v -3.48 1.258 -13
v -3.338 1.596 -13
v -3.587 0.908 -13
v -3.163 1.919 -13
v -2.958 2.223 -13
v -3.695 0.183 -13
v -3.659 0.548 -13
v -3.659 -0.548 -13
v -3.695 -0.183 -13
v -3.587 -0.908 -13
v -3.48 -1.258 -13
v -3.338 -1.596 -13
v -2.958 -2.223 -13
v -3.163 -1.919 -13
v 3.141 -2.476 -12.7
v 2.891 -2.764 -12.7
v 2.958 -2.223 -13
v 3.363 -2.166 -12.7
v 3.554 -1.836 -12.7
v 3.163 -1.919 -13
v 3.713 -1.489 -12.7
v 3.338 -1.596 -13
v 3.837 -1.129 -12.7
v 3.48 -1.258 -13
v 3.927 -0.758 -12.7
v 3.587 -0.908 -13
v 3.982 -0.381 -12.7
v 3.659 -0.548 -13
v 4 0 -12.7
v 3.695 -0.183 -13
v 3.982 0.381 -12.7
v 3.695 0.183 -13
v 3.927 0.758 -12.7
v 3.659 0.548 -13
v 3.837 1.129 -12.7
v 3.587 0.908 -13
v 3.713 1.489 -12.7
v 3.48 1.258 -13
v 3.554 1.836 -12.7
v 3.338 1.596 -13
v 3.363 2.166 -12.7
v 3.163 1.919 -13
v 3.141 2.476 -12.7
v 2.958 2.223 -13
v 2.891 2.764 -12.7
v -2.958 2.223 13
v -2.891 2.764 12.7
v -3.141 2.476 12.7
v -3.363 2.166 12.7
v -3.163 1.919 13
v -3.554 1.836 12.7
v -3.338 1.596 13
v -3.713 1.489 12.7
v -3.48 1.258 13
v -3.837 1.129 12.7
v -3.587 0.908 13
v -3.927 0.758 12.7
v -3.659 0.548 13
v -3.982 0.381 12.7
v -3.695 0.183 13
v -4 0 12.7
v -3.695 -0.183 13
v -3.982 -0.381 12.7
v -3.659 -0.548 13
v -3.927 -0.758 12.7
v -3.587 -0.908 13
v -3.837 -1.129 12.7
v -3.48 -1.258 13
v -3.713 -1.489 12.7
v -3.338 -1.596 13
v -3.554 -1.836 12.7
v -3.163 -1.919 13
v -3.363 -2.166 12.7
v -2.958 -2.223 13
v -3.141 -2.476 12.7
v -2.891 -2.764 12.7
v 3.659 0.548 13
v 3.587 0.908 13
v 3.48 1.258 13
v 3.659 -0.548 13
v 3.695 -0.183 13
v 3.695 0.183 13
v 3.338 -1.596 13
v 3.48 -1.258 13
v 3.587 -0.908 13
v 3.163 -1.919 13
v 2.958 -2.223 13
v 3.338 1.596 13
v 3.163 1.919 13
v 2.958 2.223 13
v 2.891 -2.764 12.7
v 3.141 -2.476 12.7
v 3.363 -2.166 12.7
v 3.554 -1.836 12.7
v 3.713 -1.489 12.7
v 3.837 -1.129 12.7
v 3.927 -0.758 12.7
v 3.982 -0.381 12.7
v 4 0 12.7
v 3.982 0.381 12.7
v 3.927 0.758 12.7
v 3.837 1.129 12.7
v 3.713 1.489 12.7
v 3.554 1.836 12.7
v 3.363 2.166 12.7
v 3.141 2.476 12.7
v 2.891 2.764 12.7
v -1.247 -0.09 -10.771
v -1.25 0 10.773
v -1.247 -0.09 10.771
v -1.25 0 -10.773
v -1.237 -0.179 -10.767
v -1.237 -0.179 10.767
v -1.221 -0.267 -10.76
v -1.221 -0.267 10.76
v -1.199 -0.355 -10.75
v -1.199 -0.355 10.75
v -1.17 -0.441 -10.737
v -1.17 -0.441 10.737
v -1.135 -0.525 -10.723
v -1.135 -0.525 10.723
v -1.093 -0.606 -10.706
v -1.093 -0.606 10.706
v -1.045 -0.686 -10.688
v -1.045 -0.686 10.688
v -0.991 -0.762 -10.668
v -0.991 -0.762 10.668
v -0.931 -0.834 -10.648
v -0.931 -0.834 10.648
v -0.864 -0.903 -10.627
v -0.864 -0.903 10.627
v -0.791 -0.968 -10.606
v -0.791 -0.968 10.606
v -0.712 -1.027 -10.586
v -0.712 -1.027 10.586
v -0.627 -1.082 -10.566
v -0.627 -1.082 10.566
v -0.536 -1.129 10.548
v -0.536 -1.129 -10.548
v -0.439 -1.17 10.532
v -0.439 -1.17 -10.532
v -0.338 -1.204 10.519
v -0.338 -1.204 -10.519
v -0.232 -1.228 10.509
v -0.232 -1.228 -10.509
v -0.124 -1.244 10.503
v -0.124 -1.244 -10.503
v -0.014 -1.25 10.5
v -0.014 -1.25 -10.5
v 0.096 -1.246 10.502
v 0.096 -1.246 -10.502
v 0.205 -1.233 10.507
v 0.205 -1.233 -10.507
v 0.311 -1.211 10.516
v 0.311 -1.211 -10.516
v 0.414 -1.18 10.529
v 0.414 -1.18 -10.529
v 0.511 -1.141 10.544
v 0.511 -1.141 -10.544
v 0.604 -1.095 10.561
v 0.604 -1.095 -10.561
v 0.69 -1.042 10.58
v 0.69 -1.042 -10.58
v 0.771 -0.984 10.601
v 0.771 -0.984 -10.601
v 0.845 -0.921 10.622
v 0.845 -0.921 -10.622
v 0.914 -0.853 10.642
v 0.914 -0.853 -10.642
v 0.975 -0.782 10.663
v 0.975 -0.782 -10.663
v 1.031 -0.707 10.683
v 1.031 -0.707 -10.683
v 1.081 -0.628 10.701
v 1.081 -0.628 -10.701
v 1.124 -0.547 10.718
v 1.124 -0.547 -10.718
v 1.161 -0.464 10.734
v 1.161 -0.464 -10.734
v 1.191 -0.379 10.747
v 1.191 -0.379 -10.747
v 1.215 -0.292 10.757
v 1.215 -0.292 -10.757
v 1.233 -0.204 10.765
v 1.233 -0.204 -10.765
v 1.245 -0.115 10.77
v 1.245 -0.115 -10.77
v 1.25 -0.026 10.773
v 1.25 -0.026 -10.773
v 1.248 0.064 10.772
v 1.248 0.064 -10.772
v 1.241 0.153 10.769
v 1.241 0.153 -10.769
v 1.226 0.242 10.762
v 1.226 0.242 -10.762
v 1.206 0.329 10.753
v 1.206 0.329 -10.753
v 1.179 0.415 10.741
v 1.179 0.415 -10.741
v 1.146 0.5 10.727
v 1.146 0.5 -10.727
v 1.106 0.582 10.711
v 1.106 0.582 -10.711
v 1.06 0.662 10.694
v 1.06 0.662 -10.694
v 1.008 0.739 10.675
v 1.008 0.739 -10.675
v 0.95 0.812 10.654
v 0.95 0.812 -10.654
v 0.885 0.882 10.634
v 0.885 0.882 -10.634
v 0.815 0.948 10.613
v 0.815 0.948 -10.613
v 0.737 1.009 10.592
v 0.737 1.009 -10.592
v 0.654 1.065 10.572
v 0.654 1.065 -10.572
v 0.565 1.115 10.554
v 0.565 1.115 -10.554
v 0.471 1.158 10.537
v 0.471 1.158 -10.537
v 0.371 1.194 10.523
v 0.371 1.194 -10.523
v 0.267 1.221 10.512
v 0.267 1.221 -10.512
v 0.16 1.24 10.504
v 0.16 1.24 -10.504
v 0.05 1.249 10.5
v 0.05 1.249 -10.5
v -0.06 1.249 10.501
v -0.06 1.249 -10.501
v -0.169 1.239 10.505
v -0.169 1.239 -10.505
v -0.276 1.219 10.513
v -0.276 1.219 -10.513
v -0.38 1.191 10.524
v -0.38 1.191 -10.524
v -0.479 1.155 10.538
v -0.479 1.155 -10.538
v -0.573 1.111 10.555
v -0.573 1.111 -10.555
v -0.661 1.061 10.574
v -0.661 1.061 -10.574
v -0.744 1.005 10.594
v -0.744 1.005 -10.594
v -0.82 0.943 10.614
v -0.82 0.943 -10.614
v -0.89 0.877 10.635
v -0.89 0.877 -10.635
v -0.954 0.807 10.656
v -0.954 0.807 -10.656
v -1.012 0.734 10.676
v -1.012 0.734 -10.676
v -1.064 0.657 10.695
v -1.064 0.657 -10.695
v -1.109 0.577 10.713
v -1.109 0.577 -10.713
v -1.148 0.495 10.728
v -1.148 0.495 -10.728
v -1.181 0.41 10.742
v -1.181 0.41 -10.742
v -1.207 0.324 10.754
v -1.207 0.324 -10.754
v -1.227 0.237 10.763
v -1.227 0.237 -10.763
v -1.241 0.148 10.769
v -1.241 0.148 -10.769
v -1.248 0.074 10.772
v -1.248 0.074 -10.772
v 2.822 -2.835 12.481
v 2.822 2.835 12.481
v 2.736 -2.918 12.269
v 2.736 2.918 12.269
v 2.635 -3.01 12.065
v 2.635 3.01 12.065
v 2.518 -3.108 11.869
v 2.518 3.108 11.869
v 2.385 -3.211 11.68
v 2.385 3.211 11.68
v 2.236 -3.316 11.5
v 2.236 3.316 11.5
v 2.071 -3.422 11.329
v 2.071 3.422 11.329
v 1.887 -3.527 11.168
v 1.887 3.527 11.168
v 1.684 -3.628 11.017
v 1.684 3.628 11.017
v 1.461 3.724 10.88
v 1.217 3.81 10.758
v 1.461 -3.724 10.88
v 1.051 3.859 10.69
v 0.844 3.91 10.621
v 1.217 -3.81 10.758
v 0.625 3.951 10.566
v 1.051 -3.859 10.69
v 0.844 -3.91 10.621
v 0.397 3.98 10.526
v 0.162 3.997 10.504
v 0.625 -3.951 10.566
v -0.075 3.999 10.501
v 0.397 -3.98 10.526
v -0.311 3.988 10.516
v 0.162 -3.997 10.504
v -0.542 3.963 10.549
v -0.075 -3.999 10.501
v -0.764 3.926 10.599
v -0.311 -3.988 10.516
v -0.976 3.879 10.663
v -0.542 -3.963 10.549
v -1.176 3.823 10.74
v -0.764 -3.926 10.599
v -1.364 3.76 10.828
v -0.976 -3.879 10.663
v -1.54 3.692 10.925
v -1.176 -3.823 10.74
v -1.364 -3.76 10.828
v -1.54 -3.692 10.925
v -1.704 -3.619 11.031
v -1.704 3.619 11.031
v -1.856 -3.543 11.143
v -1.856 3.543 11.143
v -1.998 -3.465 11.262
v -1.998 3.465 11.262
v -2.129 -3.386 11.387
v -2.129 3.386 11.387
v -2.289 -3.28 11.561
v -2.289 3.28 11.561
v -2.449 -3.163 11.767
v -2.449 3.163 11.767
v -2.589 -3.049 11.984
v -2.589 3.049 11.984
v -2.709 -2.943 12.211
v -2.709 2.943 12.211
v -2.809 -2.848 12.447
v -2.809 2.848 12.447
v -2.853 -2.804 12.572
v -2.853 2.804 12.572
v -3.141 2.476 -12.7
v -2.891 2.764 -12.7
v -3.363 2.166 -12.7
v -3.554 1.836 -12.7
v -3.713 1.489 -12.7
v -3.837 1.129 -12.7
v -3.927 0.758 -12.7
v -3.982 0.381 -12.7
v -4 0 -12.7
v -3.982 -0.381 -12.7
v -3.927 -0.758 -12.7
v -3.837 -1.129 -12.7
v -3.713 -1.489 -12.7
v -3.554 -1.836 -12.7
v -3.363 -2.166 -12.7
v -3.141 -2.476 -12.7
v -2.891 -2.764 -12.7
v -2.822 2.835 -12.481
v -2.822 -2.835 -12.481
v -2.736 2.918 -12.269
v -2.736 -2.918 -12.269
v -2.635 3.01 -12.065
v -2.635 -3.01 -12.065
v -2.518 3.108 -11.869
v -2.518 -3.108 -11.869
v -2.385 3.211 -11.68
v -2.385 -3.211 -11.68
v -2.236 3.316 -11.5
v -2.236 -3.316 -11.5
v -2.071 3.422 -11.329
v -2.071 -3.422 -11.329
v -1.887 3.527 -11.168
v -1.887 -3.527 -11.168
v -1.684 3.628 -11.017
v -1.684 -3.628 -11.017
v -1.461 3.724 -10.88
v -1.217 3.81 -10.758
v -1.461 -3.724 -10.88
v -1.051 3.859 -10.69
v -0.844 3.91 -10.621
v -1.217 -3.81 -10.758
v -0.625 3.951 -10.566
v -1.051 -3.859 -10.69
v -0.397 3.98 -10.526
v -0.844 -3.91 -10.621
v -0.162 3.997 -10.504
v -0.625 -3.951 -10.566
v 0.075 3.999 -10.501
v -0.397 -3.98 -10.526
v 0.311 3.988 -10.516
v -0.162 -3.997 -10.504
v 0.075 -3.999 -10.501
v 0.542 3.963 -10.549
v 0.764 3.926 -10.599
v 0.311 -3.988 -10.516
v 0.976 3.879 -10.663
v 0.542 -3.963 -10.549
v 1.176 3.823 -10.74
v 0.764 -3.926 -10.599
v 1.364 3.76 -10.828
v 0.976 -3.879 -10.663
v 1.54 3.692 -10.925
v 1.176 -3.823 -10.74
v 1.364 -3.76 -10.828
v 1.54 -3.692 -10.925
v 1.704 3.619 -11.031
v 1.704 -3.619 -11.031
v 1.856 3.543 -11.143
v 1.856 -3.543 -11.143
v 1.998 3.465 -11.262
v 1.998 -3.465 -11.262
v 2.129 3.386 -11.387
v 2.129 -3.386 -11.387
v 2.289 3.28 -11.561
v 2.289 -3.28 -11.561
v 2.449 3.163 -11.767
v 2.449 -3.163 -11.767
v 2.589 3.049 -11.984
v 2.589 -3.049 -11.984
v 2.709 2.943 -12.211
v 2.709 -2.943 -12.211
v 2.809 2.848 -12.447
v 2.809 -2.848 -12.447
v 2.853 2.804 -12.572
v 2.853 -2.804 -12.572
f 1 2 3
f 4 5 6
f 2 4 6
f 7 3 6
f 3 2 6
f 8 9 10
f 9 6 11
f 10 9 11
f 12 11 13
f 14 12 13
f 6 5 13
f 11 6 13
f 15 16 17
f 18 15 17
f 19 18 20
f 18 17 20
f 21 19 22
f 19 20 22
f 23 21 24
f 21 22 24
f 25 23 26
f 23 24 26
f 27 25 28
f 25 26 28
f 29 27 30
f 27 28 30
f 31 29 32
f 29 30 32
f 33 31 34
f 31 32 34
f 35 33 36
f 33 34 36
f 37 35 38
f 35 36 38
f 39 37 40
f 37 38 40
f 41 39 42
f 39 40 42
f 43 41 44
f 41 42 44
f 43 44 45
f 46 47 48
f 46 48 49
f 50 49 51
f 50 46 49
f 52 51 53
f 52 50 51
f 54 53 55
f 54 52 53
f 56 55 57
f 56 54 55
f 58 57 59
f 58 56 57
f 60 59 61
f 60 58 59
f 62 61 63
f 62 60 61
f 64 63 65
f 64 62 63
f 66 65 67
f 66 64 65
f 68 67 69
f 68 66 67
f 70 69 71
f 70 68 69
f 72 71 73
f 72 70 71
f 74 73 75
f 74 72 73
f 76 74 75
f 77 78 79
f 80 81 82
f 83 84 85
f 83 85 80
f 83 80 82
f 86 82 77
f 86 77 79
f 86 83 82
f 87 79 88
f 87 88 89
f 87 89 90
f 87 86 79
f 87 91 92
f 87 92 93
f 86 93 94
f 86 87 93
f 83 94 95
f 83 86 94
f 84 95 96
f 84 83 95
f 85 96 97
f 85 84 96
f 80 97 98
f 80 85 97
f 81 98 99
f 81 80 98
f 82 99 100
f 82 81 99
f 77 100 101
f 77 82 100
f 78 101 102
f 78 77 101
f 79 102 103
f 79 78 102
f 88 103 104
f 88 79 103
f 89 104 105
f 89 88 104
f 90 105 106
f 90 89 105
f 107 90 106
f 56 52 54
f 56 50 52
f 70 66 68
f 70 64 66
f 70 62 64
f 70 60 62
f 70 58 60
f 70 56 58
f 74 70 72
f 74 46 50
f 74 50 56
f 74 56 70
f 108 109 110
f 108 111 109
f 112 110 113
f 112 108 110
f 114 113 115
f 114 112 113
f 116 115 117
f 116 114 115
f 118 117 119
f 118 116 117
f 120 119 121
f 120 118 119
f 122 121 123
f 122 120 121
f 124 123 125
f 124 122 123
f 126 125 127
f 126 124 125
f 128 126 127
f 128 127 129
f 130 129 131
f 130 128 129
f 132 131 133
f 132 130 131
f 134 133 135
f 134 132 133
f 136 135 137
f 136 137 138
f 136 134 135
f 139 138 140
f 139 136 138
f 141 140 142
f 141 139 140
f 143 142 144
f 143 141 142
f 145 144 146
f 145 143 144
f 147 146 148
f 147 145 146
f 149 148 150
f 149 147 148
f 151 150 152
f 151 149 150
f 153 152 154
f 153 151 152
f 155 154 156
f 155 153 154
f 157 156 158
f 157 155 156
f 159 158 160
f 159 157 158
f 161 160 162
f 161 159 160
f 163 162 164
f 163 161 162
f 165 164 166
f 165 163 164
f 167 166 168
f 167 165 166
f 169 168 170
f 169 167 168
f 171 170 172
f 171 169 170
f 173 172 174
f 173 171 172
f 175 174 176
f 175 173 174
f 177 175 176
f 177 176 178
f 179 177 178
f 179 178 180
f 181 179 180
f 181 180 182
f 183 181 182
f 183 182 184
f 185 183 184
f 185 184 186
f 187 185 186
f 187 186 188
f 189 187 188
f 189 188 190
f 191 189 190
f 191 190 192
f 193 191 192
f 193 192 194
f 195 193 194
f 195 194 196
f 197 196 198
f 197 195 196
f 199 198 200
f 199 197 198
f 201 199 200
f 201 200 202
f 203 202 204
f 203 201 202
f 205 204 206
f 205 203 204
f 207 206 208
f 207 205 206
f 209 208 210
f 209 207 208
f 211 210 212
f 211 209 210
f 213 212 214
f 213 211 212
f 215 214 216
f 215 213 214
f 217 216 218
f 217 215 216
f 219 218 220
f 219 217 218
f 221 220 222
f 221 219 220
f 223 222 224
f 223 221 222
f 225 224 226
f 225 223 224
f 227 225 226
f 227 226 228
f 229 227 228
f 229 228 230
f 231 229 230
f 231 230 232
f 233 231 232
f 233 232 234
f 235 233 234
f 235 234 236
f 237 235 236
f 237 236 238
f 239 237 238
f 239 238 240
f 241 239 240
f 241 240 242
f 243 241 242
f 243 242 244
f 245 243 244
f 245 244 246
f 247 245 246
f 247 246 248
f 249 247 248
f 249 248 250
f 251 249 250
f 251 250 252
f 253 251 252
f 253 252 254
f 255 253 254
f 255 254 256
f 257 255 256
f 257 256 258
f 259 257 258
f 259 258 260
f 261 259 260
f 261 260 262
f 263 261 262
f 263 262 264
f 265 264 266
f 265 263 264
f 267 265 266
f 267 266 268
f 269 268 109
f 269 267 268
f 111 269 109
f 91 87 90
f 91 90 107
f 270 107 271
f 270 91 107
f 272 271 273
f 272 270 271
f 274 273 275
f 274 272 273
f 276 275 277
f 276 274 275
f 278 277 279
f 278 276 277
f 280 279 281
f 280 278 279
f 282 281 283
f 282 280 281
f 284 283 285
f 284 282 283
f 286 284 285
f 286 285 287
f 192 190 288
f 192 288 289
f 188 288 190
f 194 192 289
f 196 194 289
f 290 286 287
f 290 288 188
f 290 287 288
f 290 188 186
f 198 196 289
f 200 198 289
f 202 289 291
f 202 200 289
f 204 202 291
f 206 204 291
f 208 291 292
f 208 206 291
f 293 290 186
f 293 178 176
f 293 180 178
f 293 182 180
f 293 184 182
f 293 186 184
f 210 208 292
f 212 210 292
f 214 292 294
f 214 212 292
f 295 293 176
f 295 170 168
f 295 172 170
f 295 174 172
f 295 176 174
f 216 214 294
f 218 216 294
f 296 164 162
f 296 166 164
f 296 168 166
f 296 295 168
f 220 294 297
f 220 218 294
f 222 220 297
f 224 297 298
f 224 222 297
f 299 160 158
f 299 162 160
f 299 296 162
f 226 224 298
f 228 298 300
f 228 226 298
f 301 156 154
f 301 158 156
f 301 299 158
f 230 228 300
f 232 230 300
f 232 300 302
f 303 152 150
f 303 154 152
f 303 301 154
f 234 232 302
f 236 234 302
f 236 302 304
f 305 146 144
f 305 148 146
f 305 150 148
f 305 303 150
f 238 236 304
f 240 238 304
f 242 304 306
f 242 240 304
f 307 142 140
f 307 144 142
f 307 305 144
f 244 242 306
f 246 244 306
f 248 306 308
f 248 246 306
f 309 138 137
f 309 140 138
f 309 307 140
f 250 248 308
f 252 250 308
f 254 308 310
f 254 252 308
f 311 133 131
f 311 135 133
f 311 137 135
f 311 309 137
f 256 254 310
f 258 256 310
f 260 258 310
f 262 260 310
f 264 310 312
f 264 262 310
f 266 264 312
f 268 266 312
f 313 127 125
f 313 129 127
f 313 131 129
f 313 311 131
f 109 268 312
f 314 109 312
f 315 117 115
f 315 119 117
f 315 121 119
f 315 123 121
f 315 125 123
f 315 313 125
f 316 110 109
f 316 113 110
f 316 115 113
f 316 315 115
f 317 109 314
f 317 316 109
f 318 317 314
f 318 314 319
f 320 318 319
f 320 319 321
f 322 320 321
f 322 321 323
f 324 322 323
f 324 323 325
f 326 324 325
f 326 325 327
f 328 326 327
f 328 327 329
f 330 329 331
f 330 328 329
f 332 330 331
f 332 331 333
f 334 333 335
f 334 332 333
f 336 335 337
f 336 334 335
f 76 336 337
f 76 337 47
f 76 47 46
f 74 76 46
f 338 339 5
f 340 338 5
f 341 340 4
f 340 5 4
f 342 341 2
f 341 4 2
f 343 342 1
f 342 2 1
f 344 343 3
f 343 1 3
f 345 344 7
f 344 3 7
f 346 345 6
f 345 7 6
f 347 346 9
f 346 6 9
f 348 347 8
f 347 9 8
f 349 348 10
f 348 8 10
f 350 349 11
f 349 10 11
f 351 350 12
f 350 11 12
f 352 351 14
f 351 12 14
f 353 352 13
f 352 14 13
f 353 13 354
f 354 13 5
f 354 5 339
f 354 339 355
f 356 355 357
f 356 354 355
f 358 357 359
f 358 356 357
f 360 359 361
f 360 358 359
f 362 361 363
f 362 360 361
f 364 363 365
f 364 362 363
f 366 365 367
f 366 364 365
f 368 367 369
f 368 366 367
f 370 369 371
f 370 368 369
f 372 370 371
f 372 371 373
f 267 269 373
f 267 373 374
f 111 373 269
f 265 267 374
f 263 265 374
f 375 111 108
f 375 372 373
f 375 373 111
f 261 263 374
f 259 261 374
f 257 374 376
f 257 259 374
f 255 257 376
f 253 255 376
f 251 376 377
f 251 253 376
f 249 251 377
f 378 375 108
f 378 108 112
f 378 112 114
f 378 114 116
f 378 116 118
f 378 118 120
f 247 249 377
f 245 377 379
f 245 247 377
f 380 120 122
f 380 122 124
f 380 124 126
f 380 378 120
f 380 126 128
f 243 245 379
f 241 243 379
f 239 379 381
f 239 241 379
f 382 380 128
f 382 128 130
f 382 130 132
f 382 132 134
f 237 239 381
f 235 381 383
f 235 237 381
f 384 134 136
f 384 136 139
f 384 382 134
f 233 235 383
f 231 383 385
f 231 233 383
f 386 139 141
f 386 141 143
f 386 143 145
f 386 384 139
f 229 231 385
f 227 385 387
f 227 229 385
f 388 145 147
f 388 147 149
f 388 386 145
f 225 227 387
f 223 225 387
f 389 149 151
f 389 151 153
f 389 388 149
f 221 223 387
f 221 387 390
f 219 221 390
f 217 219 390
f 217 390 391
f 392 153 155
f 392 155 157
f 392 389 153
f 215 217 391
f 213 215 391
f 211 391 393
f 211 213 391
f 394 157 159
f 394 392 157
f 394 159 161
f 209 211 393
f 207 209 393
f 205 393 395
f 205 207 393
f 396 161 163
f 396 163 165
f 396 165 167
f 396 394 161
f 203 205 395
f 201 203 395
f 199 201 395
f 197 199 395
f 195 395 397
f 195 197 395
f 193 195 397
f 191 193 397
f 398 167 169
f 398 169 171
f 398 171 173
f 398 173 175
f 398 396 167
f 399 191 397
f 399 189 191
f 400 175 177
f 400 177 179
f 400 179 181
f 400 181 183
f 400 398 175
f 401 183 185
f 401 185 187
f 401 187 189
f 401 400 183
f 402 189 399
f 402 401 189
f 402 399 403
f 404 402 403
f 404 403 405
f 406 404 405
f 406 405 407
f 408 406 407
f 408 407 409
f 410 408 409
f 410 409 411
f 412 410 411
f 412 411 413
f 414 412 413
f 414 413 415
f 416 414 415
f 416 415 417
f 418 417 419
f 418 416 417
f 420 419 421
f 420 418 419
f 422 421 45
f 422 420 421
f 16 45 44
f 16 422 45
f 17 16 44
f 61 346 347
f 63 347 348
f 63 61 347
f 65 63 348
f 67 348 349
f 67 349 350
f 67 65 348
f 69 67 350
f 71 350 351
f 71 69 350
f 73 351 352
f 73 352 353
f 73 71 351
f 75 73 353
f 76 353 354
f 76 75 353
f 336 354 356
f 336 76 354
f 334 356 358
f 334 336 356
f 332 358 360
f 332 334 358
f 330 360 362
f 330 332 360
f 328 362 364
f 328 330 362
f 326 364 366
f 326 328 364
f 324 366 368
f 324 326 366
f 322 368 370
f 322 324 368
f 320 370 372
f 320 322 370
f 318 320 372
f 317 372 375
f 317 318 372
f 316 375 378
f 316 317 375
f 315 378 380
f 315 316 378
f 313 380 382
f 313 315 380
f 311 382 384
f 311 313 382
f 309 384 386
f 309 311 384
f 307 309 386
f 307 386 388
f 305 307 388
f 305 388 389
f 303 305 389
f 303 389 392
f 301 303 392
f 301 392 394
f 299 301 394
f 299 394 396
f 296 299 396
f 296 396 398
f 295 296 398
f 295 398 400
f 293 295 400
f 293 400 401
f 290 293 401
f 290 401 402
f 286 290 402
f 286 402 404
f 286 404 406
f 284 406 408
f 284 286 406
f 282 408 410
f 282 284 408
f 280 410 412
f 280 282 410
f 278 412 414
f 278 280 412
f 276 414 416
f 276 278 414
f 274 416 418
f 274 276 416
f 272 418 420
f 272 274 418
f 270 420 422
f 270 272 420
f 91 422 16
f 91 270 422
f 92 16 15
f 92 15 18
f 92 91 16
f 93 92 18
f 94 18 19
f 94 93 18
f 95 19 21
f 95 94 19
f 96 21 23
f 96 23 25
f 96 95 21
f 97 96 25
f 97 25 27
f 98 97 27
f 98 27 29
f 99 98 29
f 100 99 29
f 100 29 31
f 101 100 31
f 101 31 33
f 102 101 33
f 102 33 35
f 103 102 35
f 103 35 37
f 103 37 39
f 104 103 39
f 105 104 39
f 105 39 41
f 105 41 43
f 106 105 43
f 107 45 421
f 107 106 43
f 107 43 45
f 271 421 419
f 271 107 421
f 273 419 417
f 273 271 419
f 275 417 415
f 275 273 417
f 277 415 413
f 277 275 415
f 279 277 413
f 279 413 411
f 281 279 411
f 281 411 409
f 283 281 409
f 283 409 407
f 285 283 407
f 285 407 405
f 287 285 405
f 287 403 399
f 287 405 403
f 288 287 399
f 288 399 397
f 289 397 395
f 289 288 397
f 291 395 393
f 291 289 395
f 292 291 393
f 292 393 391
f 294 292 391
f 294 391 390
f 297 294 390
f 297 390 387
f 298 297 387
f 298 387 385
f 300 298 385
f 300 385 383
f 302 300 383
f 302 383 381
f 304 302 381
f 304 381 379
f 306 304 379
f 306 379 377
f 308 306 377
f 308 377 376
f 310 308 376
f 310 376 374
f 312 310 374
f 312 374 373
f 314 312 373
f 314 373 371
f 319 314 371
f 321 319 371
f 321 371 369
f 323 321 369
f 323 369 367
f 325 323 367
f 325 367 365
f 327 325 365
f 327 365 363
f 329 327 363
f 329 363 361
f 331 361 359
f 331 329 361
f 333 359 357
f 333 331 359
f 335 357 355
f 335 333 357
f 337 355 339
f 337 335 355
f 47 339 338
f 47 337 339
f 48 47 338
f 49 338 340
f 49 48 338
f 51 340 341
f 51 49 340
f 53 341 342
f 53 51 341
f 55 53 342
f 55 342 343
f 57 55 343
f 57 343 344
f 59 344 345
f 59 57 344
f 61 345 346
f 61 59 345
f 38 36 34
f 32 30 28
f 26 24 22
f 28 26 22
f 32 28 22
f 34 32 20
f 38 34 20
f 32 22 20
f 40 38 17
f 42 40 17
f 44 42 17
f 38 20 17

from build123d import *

# Parameters (mm, degrees)
ESQUISSE1_R                  = 4
ESQUISSE1_R_2                = 1.25
BOSS_EXTRU_1_DEPTH           = 13
CHANFREIN1_SIZE              = 0.3
ENL_V_MAT_EXTRU_1_DEPTH      = 15.177446879
ENL_V_MAT_EXTRU_1_DEPTH_BACK = 15.177446879
ESQUISSE2_R                  = 3


with BuildPart() as part:
    # Esquisse1 → Boss.-Extru.1 (new, symmetric)
    with BuildSketch(Plane.XY):
        with Locations(Location((0, 0, 0), (0, 0, 180))):
            Circle(ESQUISSE1_R)
        with Locations(Location((0, 0, 0), (0, 0, 180))):
            Circle(ESQUISSE1_R_2, mode=Mode.SUBTRACT)
    extrude(amount=BOSS_EXTRU_1_DEPTH, both=True)

    # Chanfrein1
    chanfrein1_edges = [part.edges().sort_by_distance(p)[0] for p in [
        (4, 0, -13),
        (4, 0, 13),
    ]]
    chamfer(chanfrein1_edges, length=CHANFREIN1_SIZE)

    # Esquisse2 → Enlèv. mat.-Extru.1 (cut, two sides: drawn at the far end of the back side and taken through both)
    with BuildSketch(Plane(origin=(0, 0, 0), x_dir=(1, 0, 0), z_dir=(0, 1, 0)).offset(-ENL_V_MAT_EXTRU_1_DEPTH_BACK)):
        with Locations((0, 13.5)):
            Circle(ESQUISSE2_R)
        with Locations((0, -13.5)):
            Circle(ESQUISSE2_R)
    extrude(amount=ENL_V_MAT_EXTRU_1_DEPTH + ENL_V_MAT_EXTRU_1_DEPTH_BACK, mode=Mode.SUBTRACT)


solid = part.part
